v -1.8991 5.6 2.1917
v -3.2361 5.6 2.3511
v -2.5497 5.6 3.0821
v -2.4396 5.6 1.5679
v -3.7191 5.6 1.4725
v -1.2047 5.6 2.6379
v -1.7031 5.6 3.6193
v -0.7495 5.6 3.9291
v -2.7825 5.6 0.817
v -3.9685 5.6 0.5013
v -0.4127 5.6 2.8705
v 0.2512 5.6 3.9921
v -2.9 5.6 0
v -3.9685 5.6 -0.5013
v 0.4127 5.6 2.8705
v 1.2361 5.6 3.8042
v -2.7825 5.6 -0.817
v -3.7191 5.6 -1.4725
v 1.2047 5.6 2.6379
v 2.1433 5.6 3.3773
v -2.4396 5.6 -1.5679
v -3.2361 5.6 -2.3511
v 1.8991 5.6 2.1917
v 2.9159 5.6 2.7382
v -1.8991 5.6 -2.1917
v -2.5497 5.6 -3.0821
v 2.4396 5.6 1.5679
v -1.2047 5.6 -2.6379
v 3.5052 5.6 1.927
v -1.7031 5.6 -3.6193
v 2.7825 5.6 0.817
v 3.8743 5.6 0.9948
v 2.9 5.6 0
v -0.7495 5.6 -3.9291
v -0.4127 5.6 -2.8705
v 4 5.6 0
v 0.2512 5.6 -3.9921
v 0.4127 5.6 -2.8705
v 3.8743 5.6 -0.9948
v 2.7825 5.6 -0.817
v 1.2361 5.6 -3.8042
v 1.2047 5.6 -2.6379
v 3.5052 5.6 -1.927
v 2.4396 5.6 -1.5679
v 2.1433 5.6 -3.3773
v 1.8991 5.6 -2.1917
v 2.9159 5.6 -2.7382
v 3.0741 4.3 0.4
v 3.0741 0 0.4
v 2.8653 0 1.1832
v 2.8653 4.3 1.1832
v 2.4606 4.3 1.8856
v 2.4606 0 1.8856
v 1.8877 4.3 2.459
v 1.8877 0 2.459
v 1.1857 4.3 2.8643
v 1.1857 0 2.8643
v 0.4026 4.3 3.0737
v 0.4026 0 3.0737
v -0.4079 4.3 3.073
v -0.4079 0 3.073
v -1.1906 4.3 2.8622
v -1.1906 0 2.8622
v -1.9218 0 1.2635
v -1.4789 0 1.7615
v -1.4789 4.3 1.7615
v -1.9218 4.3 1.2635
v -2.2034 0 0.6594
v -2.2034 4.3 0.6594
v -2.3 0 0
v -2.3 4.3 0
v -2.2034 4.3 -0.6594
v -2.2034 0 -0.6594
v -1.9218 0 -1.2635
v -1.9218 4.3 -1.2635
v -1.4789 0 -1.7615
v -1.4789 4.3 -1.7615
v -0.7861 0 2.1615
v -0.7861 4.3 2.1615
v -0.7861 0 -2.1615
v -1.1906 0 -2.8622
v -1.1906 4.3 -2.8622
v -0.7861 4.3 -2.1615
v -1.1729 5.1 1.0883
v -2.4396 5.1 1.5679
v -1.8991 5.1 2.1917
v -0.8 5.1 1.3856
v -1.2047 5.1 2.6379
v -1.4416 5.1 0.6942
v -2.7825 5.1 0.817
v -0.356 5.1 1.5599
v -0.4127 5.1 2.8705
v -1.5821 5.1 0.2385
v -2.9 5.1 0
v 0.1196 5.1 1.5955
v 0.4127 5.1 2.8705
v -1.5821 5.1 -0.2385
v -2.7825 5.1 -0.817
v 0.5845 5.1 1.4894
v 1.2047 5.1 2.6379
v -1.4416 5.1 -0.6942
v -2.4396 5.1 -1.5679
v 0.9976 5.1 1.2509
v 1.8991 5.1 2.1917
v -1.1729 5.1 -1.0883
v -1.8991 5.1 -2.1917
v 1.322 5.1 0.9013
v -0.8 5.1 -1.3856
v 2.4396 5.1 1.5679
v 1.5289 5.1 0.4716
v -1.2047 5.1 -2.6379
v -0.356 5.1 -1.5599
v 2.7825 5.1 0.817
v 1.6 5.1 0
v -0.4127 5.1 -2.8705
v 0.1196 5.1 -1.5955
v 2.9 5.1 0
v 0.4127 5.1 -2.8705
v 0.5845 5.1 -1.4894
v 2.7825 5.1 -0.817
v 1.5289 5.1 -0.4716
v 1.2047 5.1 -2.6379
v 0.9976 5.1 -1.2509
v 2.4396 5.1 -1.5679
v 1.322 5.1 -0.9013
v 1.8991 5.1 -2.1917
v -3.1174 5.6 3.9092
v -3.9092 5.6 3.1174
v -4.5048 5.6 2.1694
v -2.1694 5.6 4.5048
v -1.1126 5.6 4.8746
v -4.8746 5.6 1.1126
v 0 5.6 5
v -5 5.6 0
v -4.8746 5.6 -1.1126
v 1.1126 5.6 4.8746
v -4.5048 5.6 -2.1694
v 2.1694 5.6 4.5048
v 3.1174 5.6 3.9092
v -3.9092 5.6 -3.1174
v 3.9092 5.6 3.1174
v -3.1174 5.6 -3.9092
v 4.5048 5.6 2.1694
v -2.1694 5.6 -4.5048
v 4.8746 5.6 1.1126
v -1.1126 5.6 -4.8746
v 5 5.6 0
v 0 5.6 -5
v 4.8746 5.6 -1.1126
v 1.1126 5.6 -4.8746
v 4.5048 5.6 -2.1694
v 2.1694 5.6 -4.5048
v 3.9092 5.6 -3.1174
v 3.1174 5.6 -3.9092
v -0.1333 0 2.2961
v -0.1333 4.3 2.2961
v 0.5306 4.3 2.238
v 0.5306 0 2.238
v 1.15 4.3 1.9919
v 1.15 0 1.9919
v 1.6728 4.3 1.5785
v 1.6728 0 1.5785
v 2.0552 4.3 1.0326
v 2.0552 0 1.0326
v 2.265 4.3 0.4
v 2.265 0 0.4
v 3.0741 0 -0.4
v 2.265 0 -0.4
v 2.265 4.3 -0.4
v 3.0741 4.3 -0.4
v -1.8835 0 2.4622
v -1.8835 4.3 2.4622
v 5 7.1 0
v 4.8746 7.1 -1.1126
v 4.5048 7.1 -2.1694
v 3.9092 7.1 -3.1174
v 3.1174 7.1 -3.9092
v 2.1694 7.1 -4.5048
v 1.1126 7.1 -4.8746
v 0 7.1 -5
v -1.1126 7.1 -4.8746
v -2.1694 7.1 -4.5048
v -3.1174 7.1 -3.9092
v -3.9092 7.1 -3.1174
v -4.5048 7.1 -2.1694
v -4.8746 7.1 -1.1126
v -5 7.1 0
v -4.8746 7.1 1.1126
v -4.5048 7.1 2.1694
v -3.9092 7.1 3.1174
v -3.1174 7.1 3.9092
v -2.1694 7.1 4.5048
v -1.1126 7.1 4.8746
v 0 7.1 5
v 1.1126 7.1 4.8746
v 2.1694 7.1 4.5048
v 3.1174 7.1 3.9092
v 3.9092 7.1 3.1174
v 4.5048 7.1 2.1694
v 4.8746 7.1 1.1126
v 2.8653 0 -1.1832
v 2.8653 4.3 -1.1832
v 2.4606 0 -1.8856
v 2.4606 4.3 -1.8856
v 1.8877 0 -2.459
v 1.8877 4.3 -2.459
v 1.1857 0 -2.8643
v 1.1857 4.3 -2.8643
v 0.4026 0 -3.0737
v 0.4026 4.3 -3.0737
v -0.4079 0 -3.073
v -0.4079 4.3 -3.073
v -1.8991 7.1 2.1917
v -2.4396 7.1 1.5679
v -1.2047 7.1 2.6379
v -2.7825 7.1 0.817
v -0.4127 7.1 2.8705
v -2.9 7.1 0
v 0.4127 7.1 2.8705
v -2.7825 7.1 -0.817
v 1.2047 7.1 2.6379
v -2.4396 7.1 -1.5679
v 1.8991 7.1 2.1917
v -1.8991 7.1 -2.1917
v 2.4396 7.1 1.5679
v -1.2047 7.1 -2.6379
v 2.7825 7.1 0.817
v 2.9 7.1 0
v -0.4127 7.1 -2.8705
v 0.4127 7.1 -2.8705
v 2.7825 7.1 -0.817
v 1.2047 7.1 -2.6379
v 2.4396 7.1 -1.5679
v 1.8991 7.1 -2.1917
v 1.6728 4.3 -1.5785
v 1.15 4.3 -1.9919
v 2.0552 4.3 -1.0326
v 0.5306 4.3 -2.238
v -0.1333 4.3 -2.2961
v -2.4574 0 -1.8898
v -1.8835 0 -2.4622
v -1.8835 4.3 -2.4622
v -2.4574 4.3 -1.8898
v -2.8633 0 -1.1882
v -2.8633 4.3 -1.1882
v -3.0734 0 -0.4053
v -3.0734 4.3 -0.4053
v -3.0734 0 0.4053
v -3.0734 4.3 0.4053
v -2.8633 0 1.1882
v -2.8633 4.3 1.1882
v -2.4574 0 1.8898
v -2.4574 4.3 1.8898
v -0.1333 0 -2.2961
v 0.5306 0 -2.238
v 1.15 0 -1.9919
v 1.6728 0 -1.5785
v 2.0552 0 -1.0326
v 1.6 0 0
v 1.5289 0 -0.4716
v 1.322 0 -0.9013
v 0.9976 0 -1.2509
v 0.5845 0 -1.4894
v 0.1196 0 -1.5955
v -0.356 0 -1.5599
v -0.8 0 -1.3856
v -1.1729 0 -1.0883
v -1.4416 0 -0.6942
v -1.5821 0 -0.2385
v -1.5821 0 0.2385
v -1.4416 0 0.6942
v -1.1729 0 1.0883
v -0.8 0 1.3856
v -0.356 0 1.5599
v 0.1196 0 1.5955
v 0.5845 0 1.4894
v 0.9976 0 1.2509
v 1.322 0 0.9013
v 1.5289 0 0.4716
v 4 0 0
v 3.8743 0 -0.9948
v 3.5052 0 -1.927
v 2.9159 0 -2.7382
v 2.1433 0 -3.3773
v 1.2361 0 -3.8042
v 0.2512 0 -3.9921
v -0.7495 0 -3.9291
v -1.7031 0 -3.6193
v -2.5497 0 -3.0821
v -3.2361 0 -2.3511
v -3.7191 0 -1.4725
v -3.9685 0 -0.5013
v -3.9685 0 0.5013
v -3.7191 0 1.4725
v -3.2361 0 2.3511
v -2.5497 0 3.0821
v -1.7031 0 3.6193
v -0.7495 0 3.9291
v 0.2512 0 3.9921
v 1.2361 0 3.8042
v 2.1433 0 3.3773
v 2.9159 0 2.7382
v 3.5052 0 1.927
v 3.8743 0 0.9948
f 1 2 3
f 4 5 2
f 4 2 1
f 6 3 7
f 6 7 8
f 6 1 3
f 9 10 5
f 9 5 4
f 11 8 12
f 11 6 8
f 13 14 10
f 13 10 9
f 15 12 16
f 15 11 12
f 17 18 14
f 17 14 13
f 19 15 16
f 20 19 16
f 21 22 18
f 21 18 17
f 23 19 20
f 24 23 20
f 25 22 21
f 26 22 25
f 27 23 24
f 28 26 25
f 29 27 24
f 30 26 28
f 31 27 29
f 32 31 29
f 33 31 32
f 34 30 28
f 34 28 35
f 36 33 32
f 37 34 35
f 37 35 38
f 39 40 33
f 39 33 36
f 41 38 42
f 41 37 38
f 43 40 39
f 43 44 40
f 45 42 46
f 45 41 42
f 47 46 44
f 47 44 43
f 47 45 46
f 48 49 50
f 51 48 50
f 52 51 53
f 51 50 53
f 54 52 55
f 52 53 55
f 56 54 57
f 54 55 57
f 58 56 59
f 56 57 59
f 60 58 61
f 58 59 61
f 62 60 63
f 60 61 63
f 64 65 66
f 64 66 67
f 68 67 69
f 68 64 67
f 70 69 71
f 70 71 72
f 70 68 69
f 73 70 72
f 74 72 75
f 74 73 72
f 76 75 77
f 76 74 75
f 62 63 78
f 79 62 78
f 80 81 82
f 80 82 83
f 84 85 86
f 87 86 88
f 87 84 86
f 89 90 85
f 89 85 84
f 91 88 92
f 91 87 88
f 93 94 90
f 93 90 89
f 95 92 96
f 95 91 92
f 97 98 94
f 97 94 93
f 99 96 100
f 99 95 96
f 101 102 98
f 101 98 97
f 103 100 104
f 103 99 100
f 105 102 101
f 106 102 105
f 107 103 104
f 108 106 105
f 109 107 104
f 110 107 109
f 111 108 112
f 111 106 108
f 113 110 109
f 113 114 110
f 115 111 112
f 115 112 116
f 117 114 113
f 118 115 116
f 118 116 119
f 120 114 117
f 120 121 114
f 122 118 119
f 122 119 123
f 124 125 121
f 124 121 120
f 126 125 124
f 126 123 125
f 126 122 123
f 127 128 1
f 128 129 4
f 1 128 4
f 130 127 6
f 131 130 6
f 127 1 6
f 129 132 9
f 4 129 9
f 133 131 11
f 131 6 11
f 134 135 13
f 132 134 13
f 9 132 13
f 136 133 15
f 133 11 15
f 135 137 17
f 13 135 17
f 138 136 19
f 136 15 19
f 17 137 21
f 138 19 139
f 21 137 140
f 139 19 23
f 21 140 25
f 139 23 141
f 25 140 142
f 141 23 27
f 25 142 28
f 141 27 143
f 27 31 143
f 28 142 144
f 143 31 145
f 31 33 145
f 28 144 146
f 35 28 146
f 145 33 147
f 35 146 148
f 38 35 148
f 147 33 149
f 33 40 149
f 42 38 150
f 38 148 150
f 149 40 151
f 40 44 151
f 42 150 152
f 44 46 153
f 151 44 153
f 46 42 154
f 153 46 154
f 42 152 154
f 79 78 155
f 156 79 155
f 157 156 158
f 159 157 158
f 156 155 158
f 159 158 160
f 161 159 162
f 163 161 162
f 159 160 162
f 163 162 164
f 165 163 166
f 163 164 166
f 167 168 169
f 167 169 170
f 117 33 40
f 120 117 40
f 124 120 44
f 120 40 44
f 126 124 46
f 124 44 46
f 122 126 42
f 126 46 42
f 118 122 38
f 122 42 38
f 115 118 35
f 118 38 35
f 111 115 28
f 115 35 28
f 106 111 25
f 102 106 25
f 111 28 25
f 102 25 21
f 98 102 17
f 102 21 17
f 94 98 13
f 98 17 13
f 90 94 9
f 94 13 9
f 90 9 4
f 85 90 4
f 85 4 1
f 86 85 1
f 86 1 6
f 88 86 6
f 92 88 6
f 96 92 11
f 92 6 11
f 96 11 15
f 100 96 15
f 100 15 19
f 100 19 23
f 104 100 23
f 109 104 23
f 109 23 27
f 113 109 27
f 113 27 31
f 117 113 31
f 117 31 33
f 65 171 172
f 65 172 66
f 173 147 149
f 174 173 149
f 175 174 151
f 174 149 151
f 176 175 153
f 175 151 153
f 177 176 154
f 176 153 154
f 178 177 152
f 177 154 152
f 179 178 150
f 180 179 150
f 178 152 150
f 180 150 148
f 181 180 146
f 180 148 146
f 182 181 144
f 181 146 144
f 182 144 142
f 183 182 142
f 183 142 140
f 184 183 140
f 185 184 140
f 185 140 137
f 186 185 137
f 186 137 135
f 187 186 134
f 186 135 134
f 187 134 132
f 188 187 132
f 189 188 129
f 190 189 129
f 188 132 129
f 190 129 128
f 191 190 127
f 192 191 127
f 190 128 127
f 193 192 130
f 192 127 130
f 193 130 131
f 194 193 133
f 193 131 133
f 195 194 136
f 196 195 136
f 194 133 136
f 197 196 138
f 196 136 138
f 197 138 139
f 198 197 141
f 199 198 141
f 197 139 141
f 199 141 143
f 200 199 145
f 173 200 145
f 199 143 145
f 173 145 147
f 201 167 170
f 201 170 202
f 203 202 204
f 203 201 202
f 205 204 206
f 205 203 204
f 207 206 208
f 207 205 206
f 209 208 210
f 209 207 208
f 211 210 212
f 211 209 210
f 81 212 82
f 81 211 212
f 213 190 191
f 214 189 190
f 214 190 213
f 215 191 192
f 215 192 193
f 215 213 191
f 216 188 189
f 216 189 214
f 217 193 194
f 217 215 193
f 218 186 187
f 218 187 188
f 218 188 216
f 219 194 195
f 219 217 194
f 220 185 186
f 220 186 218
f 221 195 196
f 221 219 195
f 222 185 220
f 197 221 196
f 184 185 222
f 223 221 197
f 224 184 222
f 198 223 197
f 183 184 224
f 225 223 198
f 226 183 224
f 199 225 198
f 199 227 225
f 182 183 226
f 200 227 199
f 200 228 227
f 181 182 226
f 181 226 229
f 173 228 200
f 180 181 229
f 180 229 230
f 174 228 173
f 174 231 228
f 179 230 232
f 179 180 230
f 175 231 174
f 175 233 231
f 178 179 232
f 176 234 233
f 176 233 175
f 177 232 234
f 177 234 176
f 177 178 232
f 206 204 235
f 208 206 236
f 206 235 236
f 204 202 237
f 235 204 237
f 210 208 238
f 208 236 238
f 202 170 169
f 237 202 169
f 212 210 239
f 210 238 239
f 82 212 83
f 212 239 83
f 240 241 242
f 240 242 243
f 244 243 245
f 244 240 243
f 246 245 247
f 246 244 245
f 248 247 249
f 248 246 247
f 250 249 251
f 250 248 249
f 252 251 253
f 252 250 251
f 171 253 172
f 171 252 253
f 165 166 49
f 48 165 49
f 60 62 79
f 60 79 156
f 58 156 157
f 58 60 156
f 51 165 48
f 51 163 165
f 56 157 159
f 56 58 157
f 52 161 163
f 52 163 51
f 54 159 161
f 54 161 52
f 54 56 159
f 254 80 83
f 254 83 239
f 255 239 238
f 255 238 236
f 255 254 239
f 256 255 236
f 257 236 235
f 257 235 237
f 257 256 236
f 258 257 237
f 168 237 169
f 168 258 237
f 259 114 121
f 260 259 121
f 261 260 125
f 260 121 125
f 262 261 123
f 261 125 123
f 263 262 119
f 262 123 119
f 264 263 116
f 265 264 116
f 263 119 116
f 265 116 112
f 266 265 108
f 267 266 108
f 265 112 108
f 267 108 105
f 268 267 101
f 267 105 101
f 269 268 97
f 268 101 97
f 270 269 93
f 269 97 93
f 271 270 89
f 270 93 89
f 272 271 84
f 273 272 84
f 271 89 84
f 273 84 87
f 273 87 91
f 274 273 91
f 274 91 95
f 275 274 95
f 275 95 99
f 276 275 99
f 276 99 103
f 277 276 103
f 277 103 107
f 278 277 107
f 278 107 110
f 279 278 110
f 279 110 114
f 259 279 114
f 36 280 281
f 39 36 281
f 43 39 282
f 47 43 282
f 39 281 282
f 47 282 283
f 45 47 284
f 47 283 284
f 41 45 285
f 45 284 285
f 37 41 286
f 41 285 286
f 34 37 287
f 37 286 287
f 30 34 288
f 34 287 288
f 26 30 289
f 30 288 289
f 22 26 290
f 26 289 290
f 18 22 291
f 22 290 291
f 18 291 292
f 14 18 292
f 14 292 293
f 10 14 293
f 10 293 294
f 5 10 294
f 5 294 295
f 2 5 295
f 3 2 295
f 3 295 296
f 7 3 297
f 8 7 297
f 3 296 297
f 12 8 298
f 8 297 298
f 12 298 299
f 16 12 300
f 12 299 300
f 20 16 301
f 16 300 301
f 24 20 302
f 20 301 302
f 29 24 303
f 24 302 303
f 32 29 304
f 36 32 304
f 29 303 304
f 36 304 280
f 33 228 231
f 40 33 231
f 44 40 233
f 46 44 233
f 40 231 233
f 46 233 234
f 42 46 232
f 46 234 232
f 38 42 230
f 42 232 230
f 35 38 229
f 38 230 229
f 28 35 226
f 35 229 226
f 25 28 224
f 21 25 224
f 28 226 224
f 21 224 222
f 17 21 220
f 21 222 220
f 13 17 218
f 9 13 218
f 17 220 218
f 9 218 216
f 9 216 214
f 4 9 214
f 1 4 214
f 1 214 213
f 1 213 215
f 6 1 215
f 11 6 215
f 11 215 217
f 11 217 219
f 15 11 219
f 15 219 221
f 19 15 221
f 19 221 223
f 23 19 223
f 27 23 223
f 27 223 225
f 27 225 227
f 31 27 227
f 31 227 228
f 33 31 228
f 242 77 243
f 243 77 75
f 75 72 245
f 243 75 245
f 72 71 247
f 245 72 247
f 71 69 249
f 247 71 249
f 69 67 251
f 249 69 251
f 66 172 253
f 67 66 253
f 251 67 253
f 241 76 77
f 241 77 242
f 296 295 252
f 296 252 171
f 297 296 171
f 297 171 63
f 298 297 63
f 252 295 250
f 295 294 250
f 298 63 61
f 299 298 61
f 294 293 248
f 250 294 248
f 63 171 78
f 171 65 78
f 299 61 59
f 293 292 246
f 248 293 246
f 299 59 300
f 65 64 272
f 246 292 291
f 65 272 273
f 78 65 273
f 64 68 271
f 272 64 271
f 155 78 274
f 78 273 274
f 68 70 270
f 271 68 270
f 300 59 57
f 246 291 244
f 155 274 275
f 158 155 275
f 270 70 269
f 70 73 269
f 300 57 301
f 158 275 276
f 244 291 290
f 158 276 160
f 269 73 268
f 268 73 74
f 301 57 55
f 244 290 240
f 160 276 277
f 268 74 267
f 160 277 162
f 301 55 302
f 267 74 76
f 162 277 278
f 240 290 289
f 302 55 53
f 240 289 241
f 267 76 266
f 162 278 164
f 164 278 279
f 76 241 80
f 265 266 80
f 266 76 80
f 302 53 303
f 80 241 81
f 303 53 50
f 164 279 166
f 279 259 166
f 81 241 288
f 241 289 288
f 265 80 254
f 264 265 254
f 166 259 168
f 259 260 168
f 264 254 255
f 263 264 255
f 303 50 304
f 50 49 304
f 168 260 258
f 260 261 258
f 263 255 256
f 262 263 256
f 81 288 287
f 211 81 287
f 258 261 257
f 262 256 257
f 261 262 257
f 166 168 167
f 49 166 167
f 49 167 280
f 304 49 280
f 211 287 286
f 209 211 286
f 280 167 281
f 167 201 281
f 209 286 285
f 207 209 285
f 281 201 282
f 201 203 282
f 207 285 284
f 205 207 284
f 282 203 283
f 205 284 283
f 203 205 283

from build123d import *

# Parameters (mm, degrees)
CROQUIS2_R              = 4
SALIENTE_EXTRUIR2_DEPTH = 5.6
CROQUIS3_R              = 5
SALIENTE_EXTRUIR3_DEPTH = 1.5
CROQUIS4_R              = 2.9
CORTAR_EXTRUIR2_DEPTH   = 2
CROQUIS6_R              = 1.6
CORTAR_EXTRUIR3_DEPTH   = 6.1
CORTAR_EXTRUIR4_DEPTH   = 4.3


with BuildPart() as part:
    # Croquis2 → Saliente-Extruir2 (new body)
    with BuildSketch(Plane(origin=(0, 0, 0), x_dir=(1, 0, 0), z_dir=(0, 1, 0))):
        Circle(CROQUIS2_R)
    extrude(amount=SALIENTE_EXTRUIR2_DEPTH)


with BuildPart() as body_2:
    # Croquis3 → Saliente-Extruir3 (new body)
    with BuildSketch(Plane(origin=(0, 5.6, 0), x_dir=(1, 0, 0), z_dir=(0, 1, 0))):
        Circle(CROQUIS3_R)
    extrude(amount=SALIENTE_EXTRUIR3_DEPTH)


with BuildPart() as cortar_extruir2_tool:
    # Croquis4 → Cortar-Extruir2 (new body)
    with BuildSketch(Plane(origin=(0, 7.1, 0), x_dir=(1, 0, 0), z_dir=(0, 1, 0))):
        Circle(CROQUIS4_R)
    extrude(amount=-CORTAR_EXTRUIR2_DEPTH)


with BuildPart() as part_1:
    add(part.part)

    # Cortar-Extruir2: cut by cortar_extruir2_tool
    add(cortar_extruir2_tool.part, mode=Mode.SUBTRACT)

    # Croquis6 → Cortar-Extruir3 (cut, through all)
    with BuildSketch(Plane(origin=(0, 5.1, 0), x_dir=(1, 0, 0), z_dir=(0, 1, 0))):
        Circle(CROQUIS6_R)
    extrude(amount=-CORTAR_EXTRUIR3_DEPTH, mode=Mode.SUBTRACT)

    # Croquis7 → Cortar-Extruir4 (cut)
    with BuildSketch(Plane.XZ):
        with BuildLine():
            Line((2.264950331, 0.4), (3.07408523, 0.4))
            ThreePointArc((3.07408523, 0.4), (1.55, 2.684678752), (-1.190632453, 2.862235902))
            Line((-1.190632453, 2.862235902), (-0.786065004, 2.161504525))
            ThreePointArc((-0.786065004, 2.161504525), (1.15, 1.991858429), (2.264950331, 0.4))
        make_face()
        with BuildLine():
            Line((2.264950331, -0.4), (3.07408523, -0.4))
            ThreePointArc((3.07408523, -0.4), (1.55, -2.684678752), (-1.190632453, -2.862235902))
            Line((-1.190632453, -2.862235902), (-0.786065004, -2.161504525))
            ThreePointArc((-0.786065004, -2.161504525), (1.15, -1.991858429), (2.264950331, -0.4))
        make_face()
        with BuildLine():
            Line((-1.478885327, -1.761504525), (-1.883452776, -2.462235902))
            ThreePointArc((-1.883452776, -2.462235902), (-3.1, 0), (-1.883452776, 2.462235902))
            Line((-1.883452776, 2.462235902), (-1.478885327, 1.761504525))
            ThreePointArc((-1.478885327, 1.761504525), (-2.3, 0), (-1.478885327, -1.761504525))
        make_face()
    extrude(amount=-CORTAR_EXTRUIR4_DEPTH, mode=Mode.SUBTRACT)


with BuildPart() as body_2_1:
    add(body_2.part)

    # Cortar-Extruir2: cut by cortar_extruir2_tool
    add(cortar_extruir2_tool.part, mode=Mode.SUBTRACT)


solid = Compound([part_1.part, body_2_1.part])
